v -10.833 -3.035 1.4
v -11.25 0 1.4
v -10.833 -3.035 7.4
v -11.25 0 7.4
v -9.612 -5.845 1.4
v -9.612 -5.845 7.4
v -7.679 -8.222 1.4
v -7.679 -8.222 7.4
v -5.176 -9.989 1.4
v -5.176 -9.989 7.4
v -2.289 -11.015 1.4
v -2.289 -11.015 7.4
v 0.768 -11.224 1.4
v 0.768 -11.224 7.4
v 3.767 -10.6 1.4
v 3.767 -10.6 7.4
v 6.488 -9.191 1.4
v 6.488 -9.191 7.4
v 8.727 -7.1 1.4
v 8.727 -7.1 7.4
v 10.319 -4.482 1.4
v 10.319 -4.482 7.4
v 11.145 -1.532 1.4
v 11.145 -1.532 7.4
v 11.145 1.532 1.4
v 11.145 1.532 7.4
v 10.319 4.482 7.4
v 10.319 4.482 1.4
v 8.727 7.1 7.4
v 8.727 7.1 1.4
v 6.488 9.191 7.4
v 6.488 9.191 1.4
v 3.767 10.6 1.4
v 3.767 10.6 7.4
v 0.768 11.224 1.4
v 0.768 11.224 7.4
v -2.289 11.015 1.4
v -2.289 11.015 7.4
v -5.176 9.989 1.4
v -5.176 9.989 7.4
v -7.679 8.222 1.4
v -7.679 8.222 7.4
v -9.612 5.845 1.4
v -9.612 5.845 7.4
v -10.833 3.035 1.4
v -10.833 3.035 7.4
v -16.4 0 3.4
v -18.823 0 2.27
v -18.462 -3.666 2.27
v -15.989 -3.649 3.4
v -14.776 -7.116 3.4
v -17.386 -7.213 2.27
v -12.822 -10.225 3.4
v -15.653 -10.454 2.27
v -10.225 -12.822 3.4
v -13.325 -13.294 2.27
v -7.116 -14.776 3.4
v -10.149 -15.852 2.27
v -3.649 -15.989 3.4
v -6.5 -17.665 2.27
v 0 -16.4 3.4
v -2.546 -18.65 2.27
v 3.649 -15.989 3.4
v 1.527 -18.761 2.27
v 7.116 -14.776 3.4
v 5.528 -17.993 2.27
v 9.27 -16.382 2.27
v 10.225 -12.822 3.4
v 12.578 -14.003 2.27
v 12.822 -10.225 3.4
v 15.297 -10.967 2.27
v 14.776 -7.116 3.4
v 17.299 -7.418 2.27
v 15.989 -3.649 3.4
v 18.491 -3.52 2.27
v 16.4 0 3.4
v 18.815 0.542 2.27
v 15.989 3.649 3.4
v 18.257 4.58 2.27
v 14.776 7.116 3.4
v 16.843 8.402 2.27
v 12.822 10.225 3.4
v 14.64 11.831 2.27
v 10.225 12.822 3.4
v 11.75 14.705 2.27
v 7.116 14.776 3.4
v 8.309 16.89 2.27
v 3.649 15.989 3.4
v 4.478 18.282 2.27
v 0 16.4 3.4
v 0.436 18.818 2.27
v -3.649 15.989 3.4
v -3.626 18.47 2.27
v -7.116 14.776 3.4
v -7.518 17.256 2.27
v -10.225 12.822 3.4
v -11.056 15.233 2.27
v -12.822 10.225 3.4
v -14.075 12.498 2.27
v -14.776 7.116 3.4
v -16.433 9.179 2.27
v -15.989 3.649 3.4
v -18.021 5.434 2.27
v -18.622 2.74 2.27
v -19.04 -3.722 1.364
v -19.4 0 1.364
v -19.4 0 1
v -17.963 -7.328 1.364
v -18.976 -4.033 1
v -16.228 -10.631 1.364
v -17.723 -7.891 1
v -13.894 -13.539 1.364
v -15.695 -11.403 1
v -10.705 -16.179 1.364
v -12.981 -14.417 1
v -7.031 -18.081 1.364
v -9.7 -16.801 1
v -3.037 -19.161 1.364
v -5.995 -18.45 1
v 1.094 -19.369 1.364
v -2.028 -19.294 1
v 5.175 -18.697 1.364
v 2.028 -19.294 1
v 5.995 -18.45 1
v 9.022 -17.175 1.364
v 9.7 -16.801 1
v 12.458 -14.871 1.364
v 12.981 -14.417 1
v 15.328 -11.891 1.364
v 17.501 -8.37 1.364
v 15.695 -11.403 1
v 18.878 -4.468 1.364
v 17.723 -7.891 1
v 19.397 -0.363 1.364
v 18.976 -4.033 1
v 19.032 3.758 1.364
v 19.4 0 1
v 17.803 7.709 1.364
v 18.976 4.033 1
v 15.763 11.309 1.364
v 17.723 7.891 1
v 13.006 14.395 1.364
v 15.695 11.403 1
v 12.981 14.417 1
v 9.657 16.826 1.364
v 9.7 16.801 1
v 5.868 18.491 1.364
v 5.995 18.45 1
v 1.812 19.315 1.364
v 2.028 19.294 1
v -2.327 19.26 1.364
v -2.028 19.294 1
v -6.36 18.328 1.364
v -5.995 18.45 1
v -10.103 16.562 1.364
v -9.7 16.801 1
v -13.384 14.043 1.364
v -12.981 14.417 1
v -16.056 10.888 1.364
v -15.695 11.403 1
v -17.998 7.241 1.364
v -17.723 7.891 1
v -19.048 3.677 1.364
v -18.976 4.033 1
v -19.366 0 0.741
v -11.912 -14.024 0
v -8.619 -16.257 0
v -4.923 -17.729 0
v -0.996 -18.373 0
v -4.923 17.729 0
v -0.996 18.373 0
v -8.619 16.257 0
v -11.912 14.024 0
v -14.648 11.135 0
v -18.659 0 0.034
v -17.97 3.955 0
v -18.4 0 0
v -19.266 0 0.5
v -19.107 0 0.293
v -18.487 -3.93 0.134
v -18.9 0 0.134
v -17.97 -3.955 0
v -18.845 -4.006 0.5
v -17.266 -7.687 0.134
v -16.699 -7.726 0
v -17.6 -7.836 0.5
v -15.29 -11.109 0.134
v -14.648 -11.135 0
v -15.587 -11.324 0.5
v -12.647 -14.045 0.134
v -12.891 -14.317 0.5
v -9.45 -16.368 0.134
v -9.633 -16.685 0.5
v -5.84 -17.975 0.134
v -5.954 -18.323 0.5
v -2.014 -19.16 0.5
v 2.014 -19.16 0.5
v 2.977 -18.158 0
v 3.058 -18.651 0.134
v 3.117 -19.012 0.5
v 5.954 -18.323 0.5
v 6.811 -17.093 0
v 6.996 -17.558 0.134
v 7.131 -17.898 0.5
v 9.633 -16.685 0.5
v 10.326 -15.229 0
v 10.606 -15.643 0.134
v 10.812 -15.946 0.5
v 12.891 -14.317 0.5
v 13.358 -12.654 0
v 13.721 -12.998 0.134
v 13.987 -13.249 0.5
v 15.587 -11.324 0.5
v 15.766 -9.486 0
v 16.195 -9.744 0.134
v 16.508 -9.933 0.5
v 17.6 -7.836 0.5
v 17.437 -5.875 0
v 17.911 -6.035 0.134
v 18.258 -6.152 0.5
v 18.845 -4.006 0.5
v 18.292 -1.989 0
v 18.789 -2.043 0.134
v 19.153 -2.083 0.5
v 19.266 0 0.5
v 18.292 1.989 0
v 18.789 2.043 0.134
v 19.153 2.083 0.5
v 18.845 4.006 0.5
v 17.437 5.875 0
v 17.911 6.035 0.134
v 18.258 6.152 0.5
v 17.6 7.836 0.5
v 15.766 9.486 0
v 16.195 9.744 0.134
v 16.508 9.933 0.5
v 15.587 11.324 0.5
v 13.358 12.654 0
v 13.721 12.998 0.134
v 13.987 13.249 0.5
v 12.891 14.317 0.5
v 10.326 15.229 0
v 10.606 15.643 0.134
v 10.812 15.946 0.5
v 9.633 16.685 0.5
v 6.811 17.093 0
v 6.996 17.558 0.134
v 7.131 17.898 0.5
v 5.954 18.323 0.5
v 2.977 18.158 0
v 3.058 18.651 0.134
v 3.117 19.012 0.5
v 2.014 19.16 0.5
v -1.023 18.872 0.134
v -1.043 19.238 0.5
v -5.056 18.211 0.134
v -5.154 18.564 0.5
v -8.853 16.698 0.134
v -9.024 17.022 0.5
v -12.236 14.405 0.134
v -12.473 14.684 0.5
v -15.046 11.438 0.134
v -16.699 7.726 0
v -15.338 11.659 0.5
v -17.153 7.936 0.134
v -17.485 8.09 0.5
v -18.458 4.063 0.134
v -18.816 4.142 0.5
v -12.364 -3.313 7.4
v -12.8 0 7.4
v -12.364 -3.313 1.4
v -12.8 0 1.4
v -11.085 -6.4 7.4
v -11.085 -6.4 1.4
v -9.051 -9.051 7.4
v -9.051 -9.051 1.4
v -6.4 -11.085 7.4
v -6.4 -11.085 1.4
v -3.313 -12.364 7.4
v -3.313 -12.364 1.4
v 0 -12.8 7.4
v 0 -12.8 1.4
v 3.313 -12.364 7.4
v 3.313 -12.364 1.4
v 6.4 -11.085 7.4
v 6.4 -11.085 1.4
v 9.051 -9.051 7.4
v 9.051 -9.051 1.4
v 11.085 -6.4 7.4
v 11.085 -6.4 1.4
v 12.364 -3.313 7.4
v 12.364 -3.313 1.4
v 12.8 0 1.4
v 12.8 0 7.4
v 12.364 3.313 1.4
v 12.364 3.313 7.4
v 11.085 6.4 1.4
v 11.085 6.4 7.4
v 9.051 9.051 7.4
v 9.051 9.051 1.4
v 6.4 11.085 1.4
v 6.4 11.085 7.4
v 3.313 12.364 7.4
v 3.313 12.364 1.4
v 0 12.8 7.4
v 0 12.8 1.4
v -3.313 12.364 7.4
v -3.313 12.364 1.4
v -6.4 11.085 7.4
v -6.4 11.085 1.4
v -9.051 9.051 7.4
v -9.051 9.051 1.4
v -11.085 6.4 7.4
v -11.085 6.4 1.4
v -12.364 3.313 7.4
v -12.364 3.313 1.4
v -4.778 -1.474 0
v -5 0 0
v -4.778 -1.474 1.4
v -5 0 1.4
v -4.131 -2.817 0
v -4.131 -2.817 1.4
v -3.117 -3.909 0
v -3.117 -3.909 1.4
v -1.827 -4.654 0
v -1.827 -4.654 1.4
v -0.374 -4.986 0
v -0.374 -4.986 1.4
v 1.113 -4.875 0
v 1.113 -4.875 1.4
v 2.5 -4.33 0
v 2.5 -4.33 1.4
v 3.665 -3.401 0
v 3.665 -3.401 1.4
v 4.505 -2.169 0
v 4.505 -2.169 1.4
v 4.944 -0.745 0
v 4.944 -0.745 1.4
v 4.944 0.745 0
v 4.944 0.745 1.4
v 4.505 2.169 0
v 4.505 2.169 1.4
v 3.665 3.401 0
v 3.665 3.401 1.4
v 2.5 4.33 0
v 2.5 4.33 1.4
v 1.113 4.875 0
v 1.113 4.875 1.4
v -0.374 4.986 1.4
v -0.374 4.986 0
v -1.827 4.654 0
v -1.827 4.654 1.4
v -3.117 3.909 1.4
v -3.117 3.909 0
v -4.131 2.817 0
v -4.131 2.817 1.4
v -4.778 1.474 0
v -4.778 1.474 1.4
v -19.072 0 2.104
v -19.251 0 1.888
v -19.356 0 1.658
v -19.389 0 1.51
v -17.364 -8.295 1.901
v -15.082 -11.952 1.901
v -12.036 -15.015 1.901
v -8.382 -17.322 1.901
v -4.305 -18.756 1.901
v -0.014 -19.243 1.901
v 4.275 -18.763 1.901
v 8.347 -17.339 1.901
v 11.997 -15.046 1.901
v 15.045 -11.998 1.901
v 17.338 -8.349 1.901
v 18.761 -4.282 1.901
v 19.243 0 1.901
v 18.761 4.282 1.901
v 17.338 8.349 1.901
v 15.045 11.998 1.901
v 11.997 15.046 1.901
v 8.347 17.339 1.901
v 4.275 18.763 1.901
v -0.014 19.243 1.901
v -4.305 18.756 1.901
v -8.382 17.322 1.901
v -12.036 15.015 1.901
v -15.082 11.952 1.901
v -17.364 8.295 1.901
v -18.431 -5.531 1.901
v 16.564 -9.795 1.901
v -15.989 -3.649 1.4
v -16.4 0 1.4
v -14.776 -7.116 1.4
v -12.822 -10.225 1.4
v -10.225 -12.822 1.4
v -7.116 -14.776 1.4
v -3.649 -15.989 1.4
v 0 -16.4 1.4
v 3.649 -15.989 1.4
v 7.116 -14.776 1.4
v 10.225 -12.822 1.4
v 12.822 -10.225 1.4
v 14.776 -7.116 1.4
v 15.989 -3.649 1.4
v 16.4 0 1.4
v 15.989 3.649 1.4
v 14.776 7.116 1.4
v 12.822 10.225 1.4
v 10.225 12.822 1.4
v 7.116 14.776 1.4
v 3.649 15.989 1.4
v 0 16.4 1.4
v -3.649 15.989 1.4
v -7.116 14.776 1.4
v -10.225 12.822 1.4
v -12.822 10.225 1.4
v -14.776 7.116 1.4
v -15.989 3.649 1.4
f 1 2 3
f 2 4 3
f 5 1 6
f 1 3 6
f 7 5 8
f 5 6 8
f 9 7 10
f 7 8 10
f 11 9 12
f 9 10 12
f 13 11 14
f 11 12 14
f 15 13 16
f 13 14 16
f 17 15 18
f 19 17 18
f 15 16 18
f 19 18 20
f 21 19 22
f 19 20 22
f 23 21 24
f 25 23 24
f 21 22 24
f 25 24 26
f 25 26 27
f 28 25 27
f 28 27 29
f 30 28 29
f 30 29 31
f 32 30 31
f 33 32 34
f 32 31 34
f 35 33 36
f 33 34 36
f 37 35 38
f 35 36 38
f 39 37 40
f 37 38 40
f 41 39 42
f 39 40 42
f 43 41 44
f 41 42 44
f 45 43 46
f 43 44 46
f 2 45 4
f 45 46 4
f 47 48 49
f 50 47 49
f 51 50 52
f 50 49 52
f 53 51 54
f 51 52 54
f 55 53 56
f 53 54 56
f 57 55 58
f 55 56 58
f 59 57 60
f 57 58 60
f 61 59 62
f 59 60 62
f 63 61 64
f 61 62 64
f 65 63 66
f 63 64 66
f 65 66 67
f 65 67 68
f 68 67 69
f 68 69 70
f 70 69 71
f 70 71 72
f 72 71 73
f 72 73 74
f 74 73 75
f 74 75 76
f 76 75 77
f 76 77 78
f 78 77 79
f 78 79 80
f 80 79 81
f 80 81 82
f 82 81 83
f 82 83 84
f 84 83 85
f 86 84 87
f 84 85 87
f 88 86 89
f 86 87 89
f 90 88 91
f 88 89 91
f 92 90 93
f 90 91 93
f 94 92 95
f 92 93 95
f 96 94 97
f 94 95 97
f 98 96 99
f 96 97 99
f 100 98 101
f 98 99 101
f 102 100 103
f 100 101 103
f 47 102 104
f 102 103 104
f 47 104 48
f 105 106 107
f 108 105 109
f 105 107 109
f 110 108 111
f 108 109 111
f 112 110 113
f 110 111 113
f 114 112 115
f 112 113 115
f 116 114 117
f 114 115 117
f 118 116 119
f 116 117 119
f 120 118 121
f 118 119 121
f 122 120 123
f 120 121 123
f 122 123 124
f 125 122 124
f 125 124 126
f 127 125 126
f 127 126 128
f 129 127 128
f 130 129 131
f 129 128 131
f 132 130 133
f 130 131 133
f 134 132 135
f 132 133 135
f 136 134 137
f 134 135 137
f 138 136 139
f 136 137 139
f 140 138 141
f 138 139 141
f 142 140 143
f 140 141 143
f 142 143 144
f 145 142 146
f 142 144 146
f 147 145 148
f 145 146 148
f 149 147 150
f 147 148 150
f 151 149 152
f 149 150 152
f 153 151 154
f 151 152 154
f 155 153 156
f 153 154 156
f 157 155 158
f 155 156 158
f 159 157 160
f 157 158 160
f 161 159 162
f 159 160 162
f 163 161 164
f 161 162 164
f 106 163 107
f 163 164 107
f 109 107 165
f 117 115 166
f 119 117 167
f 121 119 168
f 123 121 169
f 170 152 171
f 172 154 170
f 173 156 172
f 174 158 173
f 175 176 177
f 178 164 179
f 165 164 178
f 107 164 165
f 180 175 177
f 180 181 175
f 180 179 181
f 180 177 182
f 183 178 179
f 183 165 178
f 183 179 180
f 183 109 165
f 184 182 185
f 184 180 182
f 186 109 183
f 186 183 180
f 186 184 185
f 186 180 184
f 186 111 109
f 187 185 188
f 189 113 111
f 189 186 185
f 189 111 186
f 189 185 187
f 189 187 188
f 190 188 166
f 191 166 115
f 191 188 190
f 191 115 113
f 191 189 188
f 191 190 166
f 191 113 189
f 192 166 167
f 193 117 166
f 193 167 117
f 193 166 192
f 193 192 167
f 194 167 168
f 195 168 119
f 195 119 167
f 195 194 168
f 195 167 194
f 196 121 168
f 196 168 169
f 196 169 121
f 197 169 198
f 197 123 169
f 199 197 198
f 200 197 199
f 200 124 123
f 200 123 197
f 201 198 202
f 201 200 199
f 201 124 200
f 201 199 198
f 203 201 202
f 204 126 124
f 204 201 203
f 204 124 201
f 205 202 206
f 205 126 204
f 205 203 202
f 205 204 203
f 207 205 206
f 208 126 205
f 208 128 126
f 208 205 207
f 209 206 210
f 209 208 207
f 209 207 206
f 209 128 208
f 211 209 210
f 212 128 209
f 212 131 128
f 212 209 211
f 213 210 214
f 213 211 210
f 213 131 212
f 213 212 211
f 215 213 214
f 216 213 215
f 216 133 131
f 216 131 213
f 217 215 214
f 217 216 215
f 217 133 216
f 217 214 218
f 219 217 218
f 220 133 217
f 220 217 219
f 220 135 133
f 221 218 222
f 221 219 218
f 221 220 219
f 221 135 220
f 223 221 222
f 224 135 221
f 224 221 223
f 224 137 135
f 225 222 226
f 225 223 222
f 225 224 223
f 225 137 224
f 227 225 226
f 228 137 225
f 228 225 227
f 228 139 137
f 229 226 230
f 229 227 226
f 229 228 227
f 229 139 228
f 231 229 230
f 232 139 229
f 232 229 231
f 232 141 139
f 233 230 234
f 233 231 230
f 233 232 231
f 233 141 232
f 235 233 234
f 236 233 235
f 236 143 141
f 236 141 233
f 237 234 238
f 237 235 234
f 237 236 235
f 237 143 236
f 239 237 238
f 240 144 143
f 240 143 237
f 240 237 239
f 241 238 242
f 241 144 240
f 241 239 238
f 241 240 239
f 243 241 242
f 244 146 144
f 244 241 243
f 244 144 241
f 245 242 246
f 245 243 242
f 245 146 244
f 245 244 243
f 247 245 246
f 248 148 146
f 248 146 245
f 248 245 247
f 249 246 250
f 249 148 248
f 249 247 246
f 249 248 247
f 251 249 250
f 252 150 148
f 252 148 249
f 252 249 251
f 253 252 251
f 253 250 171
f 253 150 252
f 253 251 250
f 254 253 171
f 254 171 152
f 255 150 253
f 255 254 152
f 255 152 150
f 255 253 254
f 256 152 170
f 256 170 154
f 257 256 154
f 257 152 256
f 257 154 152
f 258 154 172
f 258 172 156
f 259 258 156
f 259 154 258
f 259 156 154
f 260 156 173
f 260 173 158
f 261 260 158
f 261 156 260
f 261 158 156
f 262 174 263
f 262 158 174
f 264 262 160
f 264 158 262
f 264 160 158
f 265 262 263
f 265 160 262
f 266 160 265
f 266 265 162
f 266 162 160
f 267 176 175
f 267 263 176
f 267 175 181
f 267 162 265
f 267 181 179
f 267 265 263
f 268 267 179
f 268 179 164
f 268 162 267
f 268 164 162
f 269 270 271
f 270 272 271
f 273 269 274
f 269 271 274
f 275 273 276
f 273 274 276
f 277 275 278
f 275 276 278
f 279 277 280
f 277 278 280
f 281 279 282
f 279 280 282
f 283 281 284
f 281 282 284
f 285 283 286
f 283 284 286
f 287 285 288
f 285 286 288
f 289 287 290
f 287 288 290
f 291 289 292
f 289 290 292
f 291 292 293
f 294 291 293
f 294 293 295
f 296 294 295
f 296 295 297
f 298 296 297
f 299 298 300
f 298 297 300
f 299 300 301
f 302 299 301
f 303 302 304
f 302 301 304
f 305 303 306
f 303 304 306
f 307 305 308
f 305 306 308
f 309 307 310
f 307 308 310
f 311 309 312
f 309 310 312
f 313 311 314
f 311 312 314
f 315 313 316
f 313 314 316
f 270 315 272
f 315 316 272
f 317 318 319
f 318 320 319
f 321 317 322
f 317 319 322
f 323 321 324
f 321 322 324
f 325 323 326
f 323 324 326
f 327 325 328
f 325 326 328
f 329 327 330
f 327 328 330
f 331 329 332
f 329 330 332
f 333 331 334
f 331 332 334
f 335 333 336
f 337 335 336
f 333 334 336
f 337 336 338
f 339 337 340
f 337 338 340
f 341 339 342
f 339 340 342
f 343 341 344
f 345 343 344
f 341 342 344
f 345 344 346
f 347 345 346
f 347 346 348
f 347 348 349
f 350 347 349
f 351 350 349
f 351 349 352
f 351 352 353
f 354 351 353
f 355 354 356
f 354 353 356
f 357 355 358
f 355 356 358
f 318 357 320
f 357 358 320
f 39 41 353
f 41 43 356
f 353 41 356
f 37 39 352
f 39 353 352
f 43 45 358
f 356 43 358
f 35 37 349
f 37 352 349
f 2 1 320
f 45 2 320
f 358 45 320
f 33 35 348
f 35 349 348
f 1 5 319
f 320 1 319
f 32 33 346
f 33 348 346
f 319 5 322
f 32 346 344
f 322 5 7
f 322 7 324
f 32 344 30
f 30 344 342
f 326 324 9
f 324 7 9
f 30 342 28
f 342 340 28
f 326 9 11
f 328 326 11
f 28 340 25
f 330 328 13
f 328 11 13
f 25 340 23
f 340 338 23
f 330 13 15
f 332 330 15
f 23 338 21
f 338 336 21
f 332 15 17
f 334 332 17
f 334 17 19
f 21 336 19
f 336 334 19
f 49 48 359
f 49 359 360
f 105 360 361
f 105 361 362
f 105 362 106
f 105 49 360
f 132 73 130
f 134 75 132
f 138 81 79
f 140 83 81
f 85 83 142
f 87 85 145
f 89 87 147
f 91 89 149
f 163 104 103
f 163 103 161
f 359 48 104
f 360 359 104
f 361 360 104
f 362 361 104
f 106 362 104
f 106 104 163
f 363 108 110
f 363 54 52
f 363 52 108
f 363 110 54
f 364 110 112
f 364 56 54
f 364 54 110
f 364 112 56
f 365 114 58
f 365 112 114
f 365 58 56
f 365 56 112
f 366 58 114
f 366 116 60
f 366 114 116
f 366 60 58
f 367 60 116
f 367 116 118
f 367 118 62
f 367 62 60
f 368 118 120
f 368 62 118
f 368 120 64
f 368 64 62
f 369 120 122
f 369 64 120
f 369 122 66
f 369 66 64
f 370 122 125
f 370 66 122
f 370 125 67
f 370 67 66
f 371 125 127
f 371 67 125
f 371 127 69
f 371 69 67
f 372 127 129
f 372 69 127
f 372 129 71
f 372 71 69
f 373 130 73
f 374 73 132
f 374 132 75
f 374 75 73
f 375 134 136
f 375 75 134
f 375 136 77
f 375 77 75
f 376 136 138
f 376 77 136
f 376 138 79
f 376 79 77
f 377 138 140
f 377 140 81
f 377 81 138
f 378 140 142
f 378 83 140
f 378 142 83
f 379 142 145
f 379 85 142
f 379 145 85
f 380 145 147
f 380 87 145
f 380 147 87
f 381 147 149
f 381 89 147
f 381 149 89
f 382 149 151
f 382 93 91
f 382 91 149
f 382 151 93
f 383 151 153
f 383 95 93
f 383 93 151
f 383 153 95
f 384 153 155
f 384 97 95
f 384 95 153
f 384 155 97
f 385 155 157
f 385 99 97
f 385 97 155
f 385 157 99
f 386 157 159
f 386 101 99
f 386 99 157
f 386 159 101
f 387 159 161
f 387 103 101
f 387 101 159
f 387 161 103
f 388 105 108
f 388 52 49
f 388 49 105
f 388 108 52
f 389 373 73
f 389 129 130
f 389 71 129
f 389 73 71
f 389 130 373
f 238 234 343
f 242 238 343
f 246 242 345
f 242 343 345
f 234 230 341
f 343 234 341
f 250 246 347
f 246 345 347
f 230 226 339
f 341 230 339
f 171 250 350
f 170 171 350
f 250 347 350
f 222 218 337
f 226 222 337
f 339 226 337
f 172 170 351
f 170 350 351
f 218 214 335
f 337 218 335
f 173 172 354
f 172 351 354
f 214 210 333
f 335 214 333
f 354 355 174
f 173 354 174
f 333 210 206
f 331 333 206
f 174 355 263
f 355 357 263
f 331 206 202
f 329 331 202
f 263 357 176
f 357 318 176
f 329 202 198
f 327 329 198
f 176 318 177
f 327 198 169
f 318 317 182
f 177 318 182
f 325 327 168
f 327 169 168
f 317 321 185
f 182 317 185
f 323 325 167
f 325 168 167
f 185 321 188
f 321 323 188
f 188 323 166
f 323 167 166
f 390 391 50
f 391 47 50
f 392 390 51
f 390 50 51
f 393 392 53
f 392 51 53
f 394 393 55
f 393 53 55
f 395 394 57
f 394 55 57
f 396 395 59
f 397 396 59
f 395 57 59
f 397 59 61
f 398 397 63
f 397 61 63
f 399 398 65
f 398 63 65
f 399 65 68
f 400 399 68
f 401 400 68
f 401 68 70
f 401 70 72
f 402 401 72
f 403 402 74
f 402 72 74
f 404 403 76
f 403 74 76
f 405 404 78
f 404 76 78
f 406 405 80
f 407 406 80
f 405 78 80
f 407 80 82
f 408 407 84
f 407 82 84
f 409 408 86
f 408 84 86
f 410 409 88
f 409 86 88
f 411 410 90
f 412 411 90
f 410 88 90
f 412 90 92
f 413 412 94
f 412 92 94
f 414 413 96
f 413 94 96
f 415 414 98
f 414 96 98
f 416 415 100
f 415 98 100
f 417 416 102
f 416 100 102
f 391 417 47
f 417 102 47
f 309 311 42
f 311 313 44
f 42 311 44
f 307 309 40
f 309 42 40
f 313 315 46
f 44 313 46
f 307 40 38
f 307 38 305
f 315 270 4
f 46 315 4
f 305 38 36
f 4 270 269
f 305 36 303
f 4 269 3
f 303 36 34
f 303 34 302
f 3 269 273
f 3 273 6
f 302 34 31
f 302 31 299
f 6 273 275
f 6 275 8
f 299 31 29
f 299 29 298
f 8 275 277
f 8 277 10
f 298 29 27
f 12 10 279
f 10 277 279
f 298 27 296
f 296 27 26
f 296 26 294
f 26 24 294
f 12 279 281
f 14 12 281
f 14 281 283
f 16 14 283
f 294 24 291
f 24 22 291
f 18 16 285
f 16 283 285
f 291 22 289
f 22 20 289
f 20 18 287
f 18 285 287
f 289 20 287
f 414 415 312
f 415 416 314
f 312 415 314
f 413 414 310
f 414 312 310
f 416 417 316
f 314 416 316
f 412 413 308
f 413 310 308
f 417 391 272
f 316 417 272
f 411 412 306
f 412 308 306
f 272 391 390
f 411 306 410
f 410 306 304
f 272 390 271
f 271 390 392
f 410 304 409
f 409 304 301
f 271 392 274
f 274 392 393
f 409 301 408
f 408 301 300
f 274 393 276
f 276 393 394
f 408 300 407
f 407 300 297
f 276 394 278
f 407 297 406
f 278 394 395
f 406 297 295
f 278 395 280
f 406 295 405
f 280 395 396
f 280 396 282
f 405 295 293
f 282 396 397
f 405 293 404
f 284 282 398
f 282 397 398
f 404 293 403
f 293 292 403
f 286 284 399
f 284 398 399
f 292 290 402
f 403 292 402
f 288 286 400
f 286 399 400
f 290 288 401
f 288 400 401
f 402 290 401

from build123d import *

# Parameters (mm, degrees)
F2_R = 1


with BuildPart() as f1:
    # F0 (on Front) → F1 (revolve)
    with BuildSketch(Plane.XZ):
        Polygon((-19.4, 0), (-5, 0), (-5, 1.4), (-11.25, 1.4), (-11.25, 7.4), (-12.8, 7.4), (-12.8, 1.4), (-16.4, 1.4), (-16.4, 3.4), (-19.4, 2.001077), align=None)
    revolve(axis=Axis((0, 0, 4.390553), (0, 0, 1)))

    # F2
    f2_edges = [f1.edges().sort_by_distance(p)[0] for p in [
        (19.4, 0, 2.001077),
        (19.4, 0, 0),
    ]]
    fillet(f2_edges, radius=F2_R)


solid = f1.part
